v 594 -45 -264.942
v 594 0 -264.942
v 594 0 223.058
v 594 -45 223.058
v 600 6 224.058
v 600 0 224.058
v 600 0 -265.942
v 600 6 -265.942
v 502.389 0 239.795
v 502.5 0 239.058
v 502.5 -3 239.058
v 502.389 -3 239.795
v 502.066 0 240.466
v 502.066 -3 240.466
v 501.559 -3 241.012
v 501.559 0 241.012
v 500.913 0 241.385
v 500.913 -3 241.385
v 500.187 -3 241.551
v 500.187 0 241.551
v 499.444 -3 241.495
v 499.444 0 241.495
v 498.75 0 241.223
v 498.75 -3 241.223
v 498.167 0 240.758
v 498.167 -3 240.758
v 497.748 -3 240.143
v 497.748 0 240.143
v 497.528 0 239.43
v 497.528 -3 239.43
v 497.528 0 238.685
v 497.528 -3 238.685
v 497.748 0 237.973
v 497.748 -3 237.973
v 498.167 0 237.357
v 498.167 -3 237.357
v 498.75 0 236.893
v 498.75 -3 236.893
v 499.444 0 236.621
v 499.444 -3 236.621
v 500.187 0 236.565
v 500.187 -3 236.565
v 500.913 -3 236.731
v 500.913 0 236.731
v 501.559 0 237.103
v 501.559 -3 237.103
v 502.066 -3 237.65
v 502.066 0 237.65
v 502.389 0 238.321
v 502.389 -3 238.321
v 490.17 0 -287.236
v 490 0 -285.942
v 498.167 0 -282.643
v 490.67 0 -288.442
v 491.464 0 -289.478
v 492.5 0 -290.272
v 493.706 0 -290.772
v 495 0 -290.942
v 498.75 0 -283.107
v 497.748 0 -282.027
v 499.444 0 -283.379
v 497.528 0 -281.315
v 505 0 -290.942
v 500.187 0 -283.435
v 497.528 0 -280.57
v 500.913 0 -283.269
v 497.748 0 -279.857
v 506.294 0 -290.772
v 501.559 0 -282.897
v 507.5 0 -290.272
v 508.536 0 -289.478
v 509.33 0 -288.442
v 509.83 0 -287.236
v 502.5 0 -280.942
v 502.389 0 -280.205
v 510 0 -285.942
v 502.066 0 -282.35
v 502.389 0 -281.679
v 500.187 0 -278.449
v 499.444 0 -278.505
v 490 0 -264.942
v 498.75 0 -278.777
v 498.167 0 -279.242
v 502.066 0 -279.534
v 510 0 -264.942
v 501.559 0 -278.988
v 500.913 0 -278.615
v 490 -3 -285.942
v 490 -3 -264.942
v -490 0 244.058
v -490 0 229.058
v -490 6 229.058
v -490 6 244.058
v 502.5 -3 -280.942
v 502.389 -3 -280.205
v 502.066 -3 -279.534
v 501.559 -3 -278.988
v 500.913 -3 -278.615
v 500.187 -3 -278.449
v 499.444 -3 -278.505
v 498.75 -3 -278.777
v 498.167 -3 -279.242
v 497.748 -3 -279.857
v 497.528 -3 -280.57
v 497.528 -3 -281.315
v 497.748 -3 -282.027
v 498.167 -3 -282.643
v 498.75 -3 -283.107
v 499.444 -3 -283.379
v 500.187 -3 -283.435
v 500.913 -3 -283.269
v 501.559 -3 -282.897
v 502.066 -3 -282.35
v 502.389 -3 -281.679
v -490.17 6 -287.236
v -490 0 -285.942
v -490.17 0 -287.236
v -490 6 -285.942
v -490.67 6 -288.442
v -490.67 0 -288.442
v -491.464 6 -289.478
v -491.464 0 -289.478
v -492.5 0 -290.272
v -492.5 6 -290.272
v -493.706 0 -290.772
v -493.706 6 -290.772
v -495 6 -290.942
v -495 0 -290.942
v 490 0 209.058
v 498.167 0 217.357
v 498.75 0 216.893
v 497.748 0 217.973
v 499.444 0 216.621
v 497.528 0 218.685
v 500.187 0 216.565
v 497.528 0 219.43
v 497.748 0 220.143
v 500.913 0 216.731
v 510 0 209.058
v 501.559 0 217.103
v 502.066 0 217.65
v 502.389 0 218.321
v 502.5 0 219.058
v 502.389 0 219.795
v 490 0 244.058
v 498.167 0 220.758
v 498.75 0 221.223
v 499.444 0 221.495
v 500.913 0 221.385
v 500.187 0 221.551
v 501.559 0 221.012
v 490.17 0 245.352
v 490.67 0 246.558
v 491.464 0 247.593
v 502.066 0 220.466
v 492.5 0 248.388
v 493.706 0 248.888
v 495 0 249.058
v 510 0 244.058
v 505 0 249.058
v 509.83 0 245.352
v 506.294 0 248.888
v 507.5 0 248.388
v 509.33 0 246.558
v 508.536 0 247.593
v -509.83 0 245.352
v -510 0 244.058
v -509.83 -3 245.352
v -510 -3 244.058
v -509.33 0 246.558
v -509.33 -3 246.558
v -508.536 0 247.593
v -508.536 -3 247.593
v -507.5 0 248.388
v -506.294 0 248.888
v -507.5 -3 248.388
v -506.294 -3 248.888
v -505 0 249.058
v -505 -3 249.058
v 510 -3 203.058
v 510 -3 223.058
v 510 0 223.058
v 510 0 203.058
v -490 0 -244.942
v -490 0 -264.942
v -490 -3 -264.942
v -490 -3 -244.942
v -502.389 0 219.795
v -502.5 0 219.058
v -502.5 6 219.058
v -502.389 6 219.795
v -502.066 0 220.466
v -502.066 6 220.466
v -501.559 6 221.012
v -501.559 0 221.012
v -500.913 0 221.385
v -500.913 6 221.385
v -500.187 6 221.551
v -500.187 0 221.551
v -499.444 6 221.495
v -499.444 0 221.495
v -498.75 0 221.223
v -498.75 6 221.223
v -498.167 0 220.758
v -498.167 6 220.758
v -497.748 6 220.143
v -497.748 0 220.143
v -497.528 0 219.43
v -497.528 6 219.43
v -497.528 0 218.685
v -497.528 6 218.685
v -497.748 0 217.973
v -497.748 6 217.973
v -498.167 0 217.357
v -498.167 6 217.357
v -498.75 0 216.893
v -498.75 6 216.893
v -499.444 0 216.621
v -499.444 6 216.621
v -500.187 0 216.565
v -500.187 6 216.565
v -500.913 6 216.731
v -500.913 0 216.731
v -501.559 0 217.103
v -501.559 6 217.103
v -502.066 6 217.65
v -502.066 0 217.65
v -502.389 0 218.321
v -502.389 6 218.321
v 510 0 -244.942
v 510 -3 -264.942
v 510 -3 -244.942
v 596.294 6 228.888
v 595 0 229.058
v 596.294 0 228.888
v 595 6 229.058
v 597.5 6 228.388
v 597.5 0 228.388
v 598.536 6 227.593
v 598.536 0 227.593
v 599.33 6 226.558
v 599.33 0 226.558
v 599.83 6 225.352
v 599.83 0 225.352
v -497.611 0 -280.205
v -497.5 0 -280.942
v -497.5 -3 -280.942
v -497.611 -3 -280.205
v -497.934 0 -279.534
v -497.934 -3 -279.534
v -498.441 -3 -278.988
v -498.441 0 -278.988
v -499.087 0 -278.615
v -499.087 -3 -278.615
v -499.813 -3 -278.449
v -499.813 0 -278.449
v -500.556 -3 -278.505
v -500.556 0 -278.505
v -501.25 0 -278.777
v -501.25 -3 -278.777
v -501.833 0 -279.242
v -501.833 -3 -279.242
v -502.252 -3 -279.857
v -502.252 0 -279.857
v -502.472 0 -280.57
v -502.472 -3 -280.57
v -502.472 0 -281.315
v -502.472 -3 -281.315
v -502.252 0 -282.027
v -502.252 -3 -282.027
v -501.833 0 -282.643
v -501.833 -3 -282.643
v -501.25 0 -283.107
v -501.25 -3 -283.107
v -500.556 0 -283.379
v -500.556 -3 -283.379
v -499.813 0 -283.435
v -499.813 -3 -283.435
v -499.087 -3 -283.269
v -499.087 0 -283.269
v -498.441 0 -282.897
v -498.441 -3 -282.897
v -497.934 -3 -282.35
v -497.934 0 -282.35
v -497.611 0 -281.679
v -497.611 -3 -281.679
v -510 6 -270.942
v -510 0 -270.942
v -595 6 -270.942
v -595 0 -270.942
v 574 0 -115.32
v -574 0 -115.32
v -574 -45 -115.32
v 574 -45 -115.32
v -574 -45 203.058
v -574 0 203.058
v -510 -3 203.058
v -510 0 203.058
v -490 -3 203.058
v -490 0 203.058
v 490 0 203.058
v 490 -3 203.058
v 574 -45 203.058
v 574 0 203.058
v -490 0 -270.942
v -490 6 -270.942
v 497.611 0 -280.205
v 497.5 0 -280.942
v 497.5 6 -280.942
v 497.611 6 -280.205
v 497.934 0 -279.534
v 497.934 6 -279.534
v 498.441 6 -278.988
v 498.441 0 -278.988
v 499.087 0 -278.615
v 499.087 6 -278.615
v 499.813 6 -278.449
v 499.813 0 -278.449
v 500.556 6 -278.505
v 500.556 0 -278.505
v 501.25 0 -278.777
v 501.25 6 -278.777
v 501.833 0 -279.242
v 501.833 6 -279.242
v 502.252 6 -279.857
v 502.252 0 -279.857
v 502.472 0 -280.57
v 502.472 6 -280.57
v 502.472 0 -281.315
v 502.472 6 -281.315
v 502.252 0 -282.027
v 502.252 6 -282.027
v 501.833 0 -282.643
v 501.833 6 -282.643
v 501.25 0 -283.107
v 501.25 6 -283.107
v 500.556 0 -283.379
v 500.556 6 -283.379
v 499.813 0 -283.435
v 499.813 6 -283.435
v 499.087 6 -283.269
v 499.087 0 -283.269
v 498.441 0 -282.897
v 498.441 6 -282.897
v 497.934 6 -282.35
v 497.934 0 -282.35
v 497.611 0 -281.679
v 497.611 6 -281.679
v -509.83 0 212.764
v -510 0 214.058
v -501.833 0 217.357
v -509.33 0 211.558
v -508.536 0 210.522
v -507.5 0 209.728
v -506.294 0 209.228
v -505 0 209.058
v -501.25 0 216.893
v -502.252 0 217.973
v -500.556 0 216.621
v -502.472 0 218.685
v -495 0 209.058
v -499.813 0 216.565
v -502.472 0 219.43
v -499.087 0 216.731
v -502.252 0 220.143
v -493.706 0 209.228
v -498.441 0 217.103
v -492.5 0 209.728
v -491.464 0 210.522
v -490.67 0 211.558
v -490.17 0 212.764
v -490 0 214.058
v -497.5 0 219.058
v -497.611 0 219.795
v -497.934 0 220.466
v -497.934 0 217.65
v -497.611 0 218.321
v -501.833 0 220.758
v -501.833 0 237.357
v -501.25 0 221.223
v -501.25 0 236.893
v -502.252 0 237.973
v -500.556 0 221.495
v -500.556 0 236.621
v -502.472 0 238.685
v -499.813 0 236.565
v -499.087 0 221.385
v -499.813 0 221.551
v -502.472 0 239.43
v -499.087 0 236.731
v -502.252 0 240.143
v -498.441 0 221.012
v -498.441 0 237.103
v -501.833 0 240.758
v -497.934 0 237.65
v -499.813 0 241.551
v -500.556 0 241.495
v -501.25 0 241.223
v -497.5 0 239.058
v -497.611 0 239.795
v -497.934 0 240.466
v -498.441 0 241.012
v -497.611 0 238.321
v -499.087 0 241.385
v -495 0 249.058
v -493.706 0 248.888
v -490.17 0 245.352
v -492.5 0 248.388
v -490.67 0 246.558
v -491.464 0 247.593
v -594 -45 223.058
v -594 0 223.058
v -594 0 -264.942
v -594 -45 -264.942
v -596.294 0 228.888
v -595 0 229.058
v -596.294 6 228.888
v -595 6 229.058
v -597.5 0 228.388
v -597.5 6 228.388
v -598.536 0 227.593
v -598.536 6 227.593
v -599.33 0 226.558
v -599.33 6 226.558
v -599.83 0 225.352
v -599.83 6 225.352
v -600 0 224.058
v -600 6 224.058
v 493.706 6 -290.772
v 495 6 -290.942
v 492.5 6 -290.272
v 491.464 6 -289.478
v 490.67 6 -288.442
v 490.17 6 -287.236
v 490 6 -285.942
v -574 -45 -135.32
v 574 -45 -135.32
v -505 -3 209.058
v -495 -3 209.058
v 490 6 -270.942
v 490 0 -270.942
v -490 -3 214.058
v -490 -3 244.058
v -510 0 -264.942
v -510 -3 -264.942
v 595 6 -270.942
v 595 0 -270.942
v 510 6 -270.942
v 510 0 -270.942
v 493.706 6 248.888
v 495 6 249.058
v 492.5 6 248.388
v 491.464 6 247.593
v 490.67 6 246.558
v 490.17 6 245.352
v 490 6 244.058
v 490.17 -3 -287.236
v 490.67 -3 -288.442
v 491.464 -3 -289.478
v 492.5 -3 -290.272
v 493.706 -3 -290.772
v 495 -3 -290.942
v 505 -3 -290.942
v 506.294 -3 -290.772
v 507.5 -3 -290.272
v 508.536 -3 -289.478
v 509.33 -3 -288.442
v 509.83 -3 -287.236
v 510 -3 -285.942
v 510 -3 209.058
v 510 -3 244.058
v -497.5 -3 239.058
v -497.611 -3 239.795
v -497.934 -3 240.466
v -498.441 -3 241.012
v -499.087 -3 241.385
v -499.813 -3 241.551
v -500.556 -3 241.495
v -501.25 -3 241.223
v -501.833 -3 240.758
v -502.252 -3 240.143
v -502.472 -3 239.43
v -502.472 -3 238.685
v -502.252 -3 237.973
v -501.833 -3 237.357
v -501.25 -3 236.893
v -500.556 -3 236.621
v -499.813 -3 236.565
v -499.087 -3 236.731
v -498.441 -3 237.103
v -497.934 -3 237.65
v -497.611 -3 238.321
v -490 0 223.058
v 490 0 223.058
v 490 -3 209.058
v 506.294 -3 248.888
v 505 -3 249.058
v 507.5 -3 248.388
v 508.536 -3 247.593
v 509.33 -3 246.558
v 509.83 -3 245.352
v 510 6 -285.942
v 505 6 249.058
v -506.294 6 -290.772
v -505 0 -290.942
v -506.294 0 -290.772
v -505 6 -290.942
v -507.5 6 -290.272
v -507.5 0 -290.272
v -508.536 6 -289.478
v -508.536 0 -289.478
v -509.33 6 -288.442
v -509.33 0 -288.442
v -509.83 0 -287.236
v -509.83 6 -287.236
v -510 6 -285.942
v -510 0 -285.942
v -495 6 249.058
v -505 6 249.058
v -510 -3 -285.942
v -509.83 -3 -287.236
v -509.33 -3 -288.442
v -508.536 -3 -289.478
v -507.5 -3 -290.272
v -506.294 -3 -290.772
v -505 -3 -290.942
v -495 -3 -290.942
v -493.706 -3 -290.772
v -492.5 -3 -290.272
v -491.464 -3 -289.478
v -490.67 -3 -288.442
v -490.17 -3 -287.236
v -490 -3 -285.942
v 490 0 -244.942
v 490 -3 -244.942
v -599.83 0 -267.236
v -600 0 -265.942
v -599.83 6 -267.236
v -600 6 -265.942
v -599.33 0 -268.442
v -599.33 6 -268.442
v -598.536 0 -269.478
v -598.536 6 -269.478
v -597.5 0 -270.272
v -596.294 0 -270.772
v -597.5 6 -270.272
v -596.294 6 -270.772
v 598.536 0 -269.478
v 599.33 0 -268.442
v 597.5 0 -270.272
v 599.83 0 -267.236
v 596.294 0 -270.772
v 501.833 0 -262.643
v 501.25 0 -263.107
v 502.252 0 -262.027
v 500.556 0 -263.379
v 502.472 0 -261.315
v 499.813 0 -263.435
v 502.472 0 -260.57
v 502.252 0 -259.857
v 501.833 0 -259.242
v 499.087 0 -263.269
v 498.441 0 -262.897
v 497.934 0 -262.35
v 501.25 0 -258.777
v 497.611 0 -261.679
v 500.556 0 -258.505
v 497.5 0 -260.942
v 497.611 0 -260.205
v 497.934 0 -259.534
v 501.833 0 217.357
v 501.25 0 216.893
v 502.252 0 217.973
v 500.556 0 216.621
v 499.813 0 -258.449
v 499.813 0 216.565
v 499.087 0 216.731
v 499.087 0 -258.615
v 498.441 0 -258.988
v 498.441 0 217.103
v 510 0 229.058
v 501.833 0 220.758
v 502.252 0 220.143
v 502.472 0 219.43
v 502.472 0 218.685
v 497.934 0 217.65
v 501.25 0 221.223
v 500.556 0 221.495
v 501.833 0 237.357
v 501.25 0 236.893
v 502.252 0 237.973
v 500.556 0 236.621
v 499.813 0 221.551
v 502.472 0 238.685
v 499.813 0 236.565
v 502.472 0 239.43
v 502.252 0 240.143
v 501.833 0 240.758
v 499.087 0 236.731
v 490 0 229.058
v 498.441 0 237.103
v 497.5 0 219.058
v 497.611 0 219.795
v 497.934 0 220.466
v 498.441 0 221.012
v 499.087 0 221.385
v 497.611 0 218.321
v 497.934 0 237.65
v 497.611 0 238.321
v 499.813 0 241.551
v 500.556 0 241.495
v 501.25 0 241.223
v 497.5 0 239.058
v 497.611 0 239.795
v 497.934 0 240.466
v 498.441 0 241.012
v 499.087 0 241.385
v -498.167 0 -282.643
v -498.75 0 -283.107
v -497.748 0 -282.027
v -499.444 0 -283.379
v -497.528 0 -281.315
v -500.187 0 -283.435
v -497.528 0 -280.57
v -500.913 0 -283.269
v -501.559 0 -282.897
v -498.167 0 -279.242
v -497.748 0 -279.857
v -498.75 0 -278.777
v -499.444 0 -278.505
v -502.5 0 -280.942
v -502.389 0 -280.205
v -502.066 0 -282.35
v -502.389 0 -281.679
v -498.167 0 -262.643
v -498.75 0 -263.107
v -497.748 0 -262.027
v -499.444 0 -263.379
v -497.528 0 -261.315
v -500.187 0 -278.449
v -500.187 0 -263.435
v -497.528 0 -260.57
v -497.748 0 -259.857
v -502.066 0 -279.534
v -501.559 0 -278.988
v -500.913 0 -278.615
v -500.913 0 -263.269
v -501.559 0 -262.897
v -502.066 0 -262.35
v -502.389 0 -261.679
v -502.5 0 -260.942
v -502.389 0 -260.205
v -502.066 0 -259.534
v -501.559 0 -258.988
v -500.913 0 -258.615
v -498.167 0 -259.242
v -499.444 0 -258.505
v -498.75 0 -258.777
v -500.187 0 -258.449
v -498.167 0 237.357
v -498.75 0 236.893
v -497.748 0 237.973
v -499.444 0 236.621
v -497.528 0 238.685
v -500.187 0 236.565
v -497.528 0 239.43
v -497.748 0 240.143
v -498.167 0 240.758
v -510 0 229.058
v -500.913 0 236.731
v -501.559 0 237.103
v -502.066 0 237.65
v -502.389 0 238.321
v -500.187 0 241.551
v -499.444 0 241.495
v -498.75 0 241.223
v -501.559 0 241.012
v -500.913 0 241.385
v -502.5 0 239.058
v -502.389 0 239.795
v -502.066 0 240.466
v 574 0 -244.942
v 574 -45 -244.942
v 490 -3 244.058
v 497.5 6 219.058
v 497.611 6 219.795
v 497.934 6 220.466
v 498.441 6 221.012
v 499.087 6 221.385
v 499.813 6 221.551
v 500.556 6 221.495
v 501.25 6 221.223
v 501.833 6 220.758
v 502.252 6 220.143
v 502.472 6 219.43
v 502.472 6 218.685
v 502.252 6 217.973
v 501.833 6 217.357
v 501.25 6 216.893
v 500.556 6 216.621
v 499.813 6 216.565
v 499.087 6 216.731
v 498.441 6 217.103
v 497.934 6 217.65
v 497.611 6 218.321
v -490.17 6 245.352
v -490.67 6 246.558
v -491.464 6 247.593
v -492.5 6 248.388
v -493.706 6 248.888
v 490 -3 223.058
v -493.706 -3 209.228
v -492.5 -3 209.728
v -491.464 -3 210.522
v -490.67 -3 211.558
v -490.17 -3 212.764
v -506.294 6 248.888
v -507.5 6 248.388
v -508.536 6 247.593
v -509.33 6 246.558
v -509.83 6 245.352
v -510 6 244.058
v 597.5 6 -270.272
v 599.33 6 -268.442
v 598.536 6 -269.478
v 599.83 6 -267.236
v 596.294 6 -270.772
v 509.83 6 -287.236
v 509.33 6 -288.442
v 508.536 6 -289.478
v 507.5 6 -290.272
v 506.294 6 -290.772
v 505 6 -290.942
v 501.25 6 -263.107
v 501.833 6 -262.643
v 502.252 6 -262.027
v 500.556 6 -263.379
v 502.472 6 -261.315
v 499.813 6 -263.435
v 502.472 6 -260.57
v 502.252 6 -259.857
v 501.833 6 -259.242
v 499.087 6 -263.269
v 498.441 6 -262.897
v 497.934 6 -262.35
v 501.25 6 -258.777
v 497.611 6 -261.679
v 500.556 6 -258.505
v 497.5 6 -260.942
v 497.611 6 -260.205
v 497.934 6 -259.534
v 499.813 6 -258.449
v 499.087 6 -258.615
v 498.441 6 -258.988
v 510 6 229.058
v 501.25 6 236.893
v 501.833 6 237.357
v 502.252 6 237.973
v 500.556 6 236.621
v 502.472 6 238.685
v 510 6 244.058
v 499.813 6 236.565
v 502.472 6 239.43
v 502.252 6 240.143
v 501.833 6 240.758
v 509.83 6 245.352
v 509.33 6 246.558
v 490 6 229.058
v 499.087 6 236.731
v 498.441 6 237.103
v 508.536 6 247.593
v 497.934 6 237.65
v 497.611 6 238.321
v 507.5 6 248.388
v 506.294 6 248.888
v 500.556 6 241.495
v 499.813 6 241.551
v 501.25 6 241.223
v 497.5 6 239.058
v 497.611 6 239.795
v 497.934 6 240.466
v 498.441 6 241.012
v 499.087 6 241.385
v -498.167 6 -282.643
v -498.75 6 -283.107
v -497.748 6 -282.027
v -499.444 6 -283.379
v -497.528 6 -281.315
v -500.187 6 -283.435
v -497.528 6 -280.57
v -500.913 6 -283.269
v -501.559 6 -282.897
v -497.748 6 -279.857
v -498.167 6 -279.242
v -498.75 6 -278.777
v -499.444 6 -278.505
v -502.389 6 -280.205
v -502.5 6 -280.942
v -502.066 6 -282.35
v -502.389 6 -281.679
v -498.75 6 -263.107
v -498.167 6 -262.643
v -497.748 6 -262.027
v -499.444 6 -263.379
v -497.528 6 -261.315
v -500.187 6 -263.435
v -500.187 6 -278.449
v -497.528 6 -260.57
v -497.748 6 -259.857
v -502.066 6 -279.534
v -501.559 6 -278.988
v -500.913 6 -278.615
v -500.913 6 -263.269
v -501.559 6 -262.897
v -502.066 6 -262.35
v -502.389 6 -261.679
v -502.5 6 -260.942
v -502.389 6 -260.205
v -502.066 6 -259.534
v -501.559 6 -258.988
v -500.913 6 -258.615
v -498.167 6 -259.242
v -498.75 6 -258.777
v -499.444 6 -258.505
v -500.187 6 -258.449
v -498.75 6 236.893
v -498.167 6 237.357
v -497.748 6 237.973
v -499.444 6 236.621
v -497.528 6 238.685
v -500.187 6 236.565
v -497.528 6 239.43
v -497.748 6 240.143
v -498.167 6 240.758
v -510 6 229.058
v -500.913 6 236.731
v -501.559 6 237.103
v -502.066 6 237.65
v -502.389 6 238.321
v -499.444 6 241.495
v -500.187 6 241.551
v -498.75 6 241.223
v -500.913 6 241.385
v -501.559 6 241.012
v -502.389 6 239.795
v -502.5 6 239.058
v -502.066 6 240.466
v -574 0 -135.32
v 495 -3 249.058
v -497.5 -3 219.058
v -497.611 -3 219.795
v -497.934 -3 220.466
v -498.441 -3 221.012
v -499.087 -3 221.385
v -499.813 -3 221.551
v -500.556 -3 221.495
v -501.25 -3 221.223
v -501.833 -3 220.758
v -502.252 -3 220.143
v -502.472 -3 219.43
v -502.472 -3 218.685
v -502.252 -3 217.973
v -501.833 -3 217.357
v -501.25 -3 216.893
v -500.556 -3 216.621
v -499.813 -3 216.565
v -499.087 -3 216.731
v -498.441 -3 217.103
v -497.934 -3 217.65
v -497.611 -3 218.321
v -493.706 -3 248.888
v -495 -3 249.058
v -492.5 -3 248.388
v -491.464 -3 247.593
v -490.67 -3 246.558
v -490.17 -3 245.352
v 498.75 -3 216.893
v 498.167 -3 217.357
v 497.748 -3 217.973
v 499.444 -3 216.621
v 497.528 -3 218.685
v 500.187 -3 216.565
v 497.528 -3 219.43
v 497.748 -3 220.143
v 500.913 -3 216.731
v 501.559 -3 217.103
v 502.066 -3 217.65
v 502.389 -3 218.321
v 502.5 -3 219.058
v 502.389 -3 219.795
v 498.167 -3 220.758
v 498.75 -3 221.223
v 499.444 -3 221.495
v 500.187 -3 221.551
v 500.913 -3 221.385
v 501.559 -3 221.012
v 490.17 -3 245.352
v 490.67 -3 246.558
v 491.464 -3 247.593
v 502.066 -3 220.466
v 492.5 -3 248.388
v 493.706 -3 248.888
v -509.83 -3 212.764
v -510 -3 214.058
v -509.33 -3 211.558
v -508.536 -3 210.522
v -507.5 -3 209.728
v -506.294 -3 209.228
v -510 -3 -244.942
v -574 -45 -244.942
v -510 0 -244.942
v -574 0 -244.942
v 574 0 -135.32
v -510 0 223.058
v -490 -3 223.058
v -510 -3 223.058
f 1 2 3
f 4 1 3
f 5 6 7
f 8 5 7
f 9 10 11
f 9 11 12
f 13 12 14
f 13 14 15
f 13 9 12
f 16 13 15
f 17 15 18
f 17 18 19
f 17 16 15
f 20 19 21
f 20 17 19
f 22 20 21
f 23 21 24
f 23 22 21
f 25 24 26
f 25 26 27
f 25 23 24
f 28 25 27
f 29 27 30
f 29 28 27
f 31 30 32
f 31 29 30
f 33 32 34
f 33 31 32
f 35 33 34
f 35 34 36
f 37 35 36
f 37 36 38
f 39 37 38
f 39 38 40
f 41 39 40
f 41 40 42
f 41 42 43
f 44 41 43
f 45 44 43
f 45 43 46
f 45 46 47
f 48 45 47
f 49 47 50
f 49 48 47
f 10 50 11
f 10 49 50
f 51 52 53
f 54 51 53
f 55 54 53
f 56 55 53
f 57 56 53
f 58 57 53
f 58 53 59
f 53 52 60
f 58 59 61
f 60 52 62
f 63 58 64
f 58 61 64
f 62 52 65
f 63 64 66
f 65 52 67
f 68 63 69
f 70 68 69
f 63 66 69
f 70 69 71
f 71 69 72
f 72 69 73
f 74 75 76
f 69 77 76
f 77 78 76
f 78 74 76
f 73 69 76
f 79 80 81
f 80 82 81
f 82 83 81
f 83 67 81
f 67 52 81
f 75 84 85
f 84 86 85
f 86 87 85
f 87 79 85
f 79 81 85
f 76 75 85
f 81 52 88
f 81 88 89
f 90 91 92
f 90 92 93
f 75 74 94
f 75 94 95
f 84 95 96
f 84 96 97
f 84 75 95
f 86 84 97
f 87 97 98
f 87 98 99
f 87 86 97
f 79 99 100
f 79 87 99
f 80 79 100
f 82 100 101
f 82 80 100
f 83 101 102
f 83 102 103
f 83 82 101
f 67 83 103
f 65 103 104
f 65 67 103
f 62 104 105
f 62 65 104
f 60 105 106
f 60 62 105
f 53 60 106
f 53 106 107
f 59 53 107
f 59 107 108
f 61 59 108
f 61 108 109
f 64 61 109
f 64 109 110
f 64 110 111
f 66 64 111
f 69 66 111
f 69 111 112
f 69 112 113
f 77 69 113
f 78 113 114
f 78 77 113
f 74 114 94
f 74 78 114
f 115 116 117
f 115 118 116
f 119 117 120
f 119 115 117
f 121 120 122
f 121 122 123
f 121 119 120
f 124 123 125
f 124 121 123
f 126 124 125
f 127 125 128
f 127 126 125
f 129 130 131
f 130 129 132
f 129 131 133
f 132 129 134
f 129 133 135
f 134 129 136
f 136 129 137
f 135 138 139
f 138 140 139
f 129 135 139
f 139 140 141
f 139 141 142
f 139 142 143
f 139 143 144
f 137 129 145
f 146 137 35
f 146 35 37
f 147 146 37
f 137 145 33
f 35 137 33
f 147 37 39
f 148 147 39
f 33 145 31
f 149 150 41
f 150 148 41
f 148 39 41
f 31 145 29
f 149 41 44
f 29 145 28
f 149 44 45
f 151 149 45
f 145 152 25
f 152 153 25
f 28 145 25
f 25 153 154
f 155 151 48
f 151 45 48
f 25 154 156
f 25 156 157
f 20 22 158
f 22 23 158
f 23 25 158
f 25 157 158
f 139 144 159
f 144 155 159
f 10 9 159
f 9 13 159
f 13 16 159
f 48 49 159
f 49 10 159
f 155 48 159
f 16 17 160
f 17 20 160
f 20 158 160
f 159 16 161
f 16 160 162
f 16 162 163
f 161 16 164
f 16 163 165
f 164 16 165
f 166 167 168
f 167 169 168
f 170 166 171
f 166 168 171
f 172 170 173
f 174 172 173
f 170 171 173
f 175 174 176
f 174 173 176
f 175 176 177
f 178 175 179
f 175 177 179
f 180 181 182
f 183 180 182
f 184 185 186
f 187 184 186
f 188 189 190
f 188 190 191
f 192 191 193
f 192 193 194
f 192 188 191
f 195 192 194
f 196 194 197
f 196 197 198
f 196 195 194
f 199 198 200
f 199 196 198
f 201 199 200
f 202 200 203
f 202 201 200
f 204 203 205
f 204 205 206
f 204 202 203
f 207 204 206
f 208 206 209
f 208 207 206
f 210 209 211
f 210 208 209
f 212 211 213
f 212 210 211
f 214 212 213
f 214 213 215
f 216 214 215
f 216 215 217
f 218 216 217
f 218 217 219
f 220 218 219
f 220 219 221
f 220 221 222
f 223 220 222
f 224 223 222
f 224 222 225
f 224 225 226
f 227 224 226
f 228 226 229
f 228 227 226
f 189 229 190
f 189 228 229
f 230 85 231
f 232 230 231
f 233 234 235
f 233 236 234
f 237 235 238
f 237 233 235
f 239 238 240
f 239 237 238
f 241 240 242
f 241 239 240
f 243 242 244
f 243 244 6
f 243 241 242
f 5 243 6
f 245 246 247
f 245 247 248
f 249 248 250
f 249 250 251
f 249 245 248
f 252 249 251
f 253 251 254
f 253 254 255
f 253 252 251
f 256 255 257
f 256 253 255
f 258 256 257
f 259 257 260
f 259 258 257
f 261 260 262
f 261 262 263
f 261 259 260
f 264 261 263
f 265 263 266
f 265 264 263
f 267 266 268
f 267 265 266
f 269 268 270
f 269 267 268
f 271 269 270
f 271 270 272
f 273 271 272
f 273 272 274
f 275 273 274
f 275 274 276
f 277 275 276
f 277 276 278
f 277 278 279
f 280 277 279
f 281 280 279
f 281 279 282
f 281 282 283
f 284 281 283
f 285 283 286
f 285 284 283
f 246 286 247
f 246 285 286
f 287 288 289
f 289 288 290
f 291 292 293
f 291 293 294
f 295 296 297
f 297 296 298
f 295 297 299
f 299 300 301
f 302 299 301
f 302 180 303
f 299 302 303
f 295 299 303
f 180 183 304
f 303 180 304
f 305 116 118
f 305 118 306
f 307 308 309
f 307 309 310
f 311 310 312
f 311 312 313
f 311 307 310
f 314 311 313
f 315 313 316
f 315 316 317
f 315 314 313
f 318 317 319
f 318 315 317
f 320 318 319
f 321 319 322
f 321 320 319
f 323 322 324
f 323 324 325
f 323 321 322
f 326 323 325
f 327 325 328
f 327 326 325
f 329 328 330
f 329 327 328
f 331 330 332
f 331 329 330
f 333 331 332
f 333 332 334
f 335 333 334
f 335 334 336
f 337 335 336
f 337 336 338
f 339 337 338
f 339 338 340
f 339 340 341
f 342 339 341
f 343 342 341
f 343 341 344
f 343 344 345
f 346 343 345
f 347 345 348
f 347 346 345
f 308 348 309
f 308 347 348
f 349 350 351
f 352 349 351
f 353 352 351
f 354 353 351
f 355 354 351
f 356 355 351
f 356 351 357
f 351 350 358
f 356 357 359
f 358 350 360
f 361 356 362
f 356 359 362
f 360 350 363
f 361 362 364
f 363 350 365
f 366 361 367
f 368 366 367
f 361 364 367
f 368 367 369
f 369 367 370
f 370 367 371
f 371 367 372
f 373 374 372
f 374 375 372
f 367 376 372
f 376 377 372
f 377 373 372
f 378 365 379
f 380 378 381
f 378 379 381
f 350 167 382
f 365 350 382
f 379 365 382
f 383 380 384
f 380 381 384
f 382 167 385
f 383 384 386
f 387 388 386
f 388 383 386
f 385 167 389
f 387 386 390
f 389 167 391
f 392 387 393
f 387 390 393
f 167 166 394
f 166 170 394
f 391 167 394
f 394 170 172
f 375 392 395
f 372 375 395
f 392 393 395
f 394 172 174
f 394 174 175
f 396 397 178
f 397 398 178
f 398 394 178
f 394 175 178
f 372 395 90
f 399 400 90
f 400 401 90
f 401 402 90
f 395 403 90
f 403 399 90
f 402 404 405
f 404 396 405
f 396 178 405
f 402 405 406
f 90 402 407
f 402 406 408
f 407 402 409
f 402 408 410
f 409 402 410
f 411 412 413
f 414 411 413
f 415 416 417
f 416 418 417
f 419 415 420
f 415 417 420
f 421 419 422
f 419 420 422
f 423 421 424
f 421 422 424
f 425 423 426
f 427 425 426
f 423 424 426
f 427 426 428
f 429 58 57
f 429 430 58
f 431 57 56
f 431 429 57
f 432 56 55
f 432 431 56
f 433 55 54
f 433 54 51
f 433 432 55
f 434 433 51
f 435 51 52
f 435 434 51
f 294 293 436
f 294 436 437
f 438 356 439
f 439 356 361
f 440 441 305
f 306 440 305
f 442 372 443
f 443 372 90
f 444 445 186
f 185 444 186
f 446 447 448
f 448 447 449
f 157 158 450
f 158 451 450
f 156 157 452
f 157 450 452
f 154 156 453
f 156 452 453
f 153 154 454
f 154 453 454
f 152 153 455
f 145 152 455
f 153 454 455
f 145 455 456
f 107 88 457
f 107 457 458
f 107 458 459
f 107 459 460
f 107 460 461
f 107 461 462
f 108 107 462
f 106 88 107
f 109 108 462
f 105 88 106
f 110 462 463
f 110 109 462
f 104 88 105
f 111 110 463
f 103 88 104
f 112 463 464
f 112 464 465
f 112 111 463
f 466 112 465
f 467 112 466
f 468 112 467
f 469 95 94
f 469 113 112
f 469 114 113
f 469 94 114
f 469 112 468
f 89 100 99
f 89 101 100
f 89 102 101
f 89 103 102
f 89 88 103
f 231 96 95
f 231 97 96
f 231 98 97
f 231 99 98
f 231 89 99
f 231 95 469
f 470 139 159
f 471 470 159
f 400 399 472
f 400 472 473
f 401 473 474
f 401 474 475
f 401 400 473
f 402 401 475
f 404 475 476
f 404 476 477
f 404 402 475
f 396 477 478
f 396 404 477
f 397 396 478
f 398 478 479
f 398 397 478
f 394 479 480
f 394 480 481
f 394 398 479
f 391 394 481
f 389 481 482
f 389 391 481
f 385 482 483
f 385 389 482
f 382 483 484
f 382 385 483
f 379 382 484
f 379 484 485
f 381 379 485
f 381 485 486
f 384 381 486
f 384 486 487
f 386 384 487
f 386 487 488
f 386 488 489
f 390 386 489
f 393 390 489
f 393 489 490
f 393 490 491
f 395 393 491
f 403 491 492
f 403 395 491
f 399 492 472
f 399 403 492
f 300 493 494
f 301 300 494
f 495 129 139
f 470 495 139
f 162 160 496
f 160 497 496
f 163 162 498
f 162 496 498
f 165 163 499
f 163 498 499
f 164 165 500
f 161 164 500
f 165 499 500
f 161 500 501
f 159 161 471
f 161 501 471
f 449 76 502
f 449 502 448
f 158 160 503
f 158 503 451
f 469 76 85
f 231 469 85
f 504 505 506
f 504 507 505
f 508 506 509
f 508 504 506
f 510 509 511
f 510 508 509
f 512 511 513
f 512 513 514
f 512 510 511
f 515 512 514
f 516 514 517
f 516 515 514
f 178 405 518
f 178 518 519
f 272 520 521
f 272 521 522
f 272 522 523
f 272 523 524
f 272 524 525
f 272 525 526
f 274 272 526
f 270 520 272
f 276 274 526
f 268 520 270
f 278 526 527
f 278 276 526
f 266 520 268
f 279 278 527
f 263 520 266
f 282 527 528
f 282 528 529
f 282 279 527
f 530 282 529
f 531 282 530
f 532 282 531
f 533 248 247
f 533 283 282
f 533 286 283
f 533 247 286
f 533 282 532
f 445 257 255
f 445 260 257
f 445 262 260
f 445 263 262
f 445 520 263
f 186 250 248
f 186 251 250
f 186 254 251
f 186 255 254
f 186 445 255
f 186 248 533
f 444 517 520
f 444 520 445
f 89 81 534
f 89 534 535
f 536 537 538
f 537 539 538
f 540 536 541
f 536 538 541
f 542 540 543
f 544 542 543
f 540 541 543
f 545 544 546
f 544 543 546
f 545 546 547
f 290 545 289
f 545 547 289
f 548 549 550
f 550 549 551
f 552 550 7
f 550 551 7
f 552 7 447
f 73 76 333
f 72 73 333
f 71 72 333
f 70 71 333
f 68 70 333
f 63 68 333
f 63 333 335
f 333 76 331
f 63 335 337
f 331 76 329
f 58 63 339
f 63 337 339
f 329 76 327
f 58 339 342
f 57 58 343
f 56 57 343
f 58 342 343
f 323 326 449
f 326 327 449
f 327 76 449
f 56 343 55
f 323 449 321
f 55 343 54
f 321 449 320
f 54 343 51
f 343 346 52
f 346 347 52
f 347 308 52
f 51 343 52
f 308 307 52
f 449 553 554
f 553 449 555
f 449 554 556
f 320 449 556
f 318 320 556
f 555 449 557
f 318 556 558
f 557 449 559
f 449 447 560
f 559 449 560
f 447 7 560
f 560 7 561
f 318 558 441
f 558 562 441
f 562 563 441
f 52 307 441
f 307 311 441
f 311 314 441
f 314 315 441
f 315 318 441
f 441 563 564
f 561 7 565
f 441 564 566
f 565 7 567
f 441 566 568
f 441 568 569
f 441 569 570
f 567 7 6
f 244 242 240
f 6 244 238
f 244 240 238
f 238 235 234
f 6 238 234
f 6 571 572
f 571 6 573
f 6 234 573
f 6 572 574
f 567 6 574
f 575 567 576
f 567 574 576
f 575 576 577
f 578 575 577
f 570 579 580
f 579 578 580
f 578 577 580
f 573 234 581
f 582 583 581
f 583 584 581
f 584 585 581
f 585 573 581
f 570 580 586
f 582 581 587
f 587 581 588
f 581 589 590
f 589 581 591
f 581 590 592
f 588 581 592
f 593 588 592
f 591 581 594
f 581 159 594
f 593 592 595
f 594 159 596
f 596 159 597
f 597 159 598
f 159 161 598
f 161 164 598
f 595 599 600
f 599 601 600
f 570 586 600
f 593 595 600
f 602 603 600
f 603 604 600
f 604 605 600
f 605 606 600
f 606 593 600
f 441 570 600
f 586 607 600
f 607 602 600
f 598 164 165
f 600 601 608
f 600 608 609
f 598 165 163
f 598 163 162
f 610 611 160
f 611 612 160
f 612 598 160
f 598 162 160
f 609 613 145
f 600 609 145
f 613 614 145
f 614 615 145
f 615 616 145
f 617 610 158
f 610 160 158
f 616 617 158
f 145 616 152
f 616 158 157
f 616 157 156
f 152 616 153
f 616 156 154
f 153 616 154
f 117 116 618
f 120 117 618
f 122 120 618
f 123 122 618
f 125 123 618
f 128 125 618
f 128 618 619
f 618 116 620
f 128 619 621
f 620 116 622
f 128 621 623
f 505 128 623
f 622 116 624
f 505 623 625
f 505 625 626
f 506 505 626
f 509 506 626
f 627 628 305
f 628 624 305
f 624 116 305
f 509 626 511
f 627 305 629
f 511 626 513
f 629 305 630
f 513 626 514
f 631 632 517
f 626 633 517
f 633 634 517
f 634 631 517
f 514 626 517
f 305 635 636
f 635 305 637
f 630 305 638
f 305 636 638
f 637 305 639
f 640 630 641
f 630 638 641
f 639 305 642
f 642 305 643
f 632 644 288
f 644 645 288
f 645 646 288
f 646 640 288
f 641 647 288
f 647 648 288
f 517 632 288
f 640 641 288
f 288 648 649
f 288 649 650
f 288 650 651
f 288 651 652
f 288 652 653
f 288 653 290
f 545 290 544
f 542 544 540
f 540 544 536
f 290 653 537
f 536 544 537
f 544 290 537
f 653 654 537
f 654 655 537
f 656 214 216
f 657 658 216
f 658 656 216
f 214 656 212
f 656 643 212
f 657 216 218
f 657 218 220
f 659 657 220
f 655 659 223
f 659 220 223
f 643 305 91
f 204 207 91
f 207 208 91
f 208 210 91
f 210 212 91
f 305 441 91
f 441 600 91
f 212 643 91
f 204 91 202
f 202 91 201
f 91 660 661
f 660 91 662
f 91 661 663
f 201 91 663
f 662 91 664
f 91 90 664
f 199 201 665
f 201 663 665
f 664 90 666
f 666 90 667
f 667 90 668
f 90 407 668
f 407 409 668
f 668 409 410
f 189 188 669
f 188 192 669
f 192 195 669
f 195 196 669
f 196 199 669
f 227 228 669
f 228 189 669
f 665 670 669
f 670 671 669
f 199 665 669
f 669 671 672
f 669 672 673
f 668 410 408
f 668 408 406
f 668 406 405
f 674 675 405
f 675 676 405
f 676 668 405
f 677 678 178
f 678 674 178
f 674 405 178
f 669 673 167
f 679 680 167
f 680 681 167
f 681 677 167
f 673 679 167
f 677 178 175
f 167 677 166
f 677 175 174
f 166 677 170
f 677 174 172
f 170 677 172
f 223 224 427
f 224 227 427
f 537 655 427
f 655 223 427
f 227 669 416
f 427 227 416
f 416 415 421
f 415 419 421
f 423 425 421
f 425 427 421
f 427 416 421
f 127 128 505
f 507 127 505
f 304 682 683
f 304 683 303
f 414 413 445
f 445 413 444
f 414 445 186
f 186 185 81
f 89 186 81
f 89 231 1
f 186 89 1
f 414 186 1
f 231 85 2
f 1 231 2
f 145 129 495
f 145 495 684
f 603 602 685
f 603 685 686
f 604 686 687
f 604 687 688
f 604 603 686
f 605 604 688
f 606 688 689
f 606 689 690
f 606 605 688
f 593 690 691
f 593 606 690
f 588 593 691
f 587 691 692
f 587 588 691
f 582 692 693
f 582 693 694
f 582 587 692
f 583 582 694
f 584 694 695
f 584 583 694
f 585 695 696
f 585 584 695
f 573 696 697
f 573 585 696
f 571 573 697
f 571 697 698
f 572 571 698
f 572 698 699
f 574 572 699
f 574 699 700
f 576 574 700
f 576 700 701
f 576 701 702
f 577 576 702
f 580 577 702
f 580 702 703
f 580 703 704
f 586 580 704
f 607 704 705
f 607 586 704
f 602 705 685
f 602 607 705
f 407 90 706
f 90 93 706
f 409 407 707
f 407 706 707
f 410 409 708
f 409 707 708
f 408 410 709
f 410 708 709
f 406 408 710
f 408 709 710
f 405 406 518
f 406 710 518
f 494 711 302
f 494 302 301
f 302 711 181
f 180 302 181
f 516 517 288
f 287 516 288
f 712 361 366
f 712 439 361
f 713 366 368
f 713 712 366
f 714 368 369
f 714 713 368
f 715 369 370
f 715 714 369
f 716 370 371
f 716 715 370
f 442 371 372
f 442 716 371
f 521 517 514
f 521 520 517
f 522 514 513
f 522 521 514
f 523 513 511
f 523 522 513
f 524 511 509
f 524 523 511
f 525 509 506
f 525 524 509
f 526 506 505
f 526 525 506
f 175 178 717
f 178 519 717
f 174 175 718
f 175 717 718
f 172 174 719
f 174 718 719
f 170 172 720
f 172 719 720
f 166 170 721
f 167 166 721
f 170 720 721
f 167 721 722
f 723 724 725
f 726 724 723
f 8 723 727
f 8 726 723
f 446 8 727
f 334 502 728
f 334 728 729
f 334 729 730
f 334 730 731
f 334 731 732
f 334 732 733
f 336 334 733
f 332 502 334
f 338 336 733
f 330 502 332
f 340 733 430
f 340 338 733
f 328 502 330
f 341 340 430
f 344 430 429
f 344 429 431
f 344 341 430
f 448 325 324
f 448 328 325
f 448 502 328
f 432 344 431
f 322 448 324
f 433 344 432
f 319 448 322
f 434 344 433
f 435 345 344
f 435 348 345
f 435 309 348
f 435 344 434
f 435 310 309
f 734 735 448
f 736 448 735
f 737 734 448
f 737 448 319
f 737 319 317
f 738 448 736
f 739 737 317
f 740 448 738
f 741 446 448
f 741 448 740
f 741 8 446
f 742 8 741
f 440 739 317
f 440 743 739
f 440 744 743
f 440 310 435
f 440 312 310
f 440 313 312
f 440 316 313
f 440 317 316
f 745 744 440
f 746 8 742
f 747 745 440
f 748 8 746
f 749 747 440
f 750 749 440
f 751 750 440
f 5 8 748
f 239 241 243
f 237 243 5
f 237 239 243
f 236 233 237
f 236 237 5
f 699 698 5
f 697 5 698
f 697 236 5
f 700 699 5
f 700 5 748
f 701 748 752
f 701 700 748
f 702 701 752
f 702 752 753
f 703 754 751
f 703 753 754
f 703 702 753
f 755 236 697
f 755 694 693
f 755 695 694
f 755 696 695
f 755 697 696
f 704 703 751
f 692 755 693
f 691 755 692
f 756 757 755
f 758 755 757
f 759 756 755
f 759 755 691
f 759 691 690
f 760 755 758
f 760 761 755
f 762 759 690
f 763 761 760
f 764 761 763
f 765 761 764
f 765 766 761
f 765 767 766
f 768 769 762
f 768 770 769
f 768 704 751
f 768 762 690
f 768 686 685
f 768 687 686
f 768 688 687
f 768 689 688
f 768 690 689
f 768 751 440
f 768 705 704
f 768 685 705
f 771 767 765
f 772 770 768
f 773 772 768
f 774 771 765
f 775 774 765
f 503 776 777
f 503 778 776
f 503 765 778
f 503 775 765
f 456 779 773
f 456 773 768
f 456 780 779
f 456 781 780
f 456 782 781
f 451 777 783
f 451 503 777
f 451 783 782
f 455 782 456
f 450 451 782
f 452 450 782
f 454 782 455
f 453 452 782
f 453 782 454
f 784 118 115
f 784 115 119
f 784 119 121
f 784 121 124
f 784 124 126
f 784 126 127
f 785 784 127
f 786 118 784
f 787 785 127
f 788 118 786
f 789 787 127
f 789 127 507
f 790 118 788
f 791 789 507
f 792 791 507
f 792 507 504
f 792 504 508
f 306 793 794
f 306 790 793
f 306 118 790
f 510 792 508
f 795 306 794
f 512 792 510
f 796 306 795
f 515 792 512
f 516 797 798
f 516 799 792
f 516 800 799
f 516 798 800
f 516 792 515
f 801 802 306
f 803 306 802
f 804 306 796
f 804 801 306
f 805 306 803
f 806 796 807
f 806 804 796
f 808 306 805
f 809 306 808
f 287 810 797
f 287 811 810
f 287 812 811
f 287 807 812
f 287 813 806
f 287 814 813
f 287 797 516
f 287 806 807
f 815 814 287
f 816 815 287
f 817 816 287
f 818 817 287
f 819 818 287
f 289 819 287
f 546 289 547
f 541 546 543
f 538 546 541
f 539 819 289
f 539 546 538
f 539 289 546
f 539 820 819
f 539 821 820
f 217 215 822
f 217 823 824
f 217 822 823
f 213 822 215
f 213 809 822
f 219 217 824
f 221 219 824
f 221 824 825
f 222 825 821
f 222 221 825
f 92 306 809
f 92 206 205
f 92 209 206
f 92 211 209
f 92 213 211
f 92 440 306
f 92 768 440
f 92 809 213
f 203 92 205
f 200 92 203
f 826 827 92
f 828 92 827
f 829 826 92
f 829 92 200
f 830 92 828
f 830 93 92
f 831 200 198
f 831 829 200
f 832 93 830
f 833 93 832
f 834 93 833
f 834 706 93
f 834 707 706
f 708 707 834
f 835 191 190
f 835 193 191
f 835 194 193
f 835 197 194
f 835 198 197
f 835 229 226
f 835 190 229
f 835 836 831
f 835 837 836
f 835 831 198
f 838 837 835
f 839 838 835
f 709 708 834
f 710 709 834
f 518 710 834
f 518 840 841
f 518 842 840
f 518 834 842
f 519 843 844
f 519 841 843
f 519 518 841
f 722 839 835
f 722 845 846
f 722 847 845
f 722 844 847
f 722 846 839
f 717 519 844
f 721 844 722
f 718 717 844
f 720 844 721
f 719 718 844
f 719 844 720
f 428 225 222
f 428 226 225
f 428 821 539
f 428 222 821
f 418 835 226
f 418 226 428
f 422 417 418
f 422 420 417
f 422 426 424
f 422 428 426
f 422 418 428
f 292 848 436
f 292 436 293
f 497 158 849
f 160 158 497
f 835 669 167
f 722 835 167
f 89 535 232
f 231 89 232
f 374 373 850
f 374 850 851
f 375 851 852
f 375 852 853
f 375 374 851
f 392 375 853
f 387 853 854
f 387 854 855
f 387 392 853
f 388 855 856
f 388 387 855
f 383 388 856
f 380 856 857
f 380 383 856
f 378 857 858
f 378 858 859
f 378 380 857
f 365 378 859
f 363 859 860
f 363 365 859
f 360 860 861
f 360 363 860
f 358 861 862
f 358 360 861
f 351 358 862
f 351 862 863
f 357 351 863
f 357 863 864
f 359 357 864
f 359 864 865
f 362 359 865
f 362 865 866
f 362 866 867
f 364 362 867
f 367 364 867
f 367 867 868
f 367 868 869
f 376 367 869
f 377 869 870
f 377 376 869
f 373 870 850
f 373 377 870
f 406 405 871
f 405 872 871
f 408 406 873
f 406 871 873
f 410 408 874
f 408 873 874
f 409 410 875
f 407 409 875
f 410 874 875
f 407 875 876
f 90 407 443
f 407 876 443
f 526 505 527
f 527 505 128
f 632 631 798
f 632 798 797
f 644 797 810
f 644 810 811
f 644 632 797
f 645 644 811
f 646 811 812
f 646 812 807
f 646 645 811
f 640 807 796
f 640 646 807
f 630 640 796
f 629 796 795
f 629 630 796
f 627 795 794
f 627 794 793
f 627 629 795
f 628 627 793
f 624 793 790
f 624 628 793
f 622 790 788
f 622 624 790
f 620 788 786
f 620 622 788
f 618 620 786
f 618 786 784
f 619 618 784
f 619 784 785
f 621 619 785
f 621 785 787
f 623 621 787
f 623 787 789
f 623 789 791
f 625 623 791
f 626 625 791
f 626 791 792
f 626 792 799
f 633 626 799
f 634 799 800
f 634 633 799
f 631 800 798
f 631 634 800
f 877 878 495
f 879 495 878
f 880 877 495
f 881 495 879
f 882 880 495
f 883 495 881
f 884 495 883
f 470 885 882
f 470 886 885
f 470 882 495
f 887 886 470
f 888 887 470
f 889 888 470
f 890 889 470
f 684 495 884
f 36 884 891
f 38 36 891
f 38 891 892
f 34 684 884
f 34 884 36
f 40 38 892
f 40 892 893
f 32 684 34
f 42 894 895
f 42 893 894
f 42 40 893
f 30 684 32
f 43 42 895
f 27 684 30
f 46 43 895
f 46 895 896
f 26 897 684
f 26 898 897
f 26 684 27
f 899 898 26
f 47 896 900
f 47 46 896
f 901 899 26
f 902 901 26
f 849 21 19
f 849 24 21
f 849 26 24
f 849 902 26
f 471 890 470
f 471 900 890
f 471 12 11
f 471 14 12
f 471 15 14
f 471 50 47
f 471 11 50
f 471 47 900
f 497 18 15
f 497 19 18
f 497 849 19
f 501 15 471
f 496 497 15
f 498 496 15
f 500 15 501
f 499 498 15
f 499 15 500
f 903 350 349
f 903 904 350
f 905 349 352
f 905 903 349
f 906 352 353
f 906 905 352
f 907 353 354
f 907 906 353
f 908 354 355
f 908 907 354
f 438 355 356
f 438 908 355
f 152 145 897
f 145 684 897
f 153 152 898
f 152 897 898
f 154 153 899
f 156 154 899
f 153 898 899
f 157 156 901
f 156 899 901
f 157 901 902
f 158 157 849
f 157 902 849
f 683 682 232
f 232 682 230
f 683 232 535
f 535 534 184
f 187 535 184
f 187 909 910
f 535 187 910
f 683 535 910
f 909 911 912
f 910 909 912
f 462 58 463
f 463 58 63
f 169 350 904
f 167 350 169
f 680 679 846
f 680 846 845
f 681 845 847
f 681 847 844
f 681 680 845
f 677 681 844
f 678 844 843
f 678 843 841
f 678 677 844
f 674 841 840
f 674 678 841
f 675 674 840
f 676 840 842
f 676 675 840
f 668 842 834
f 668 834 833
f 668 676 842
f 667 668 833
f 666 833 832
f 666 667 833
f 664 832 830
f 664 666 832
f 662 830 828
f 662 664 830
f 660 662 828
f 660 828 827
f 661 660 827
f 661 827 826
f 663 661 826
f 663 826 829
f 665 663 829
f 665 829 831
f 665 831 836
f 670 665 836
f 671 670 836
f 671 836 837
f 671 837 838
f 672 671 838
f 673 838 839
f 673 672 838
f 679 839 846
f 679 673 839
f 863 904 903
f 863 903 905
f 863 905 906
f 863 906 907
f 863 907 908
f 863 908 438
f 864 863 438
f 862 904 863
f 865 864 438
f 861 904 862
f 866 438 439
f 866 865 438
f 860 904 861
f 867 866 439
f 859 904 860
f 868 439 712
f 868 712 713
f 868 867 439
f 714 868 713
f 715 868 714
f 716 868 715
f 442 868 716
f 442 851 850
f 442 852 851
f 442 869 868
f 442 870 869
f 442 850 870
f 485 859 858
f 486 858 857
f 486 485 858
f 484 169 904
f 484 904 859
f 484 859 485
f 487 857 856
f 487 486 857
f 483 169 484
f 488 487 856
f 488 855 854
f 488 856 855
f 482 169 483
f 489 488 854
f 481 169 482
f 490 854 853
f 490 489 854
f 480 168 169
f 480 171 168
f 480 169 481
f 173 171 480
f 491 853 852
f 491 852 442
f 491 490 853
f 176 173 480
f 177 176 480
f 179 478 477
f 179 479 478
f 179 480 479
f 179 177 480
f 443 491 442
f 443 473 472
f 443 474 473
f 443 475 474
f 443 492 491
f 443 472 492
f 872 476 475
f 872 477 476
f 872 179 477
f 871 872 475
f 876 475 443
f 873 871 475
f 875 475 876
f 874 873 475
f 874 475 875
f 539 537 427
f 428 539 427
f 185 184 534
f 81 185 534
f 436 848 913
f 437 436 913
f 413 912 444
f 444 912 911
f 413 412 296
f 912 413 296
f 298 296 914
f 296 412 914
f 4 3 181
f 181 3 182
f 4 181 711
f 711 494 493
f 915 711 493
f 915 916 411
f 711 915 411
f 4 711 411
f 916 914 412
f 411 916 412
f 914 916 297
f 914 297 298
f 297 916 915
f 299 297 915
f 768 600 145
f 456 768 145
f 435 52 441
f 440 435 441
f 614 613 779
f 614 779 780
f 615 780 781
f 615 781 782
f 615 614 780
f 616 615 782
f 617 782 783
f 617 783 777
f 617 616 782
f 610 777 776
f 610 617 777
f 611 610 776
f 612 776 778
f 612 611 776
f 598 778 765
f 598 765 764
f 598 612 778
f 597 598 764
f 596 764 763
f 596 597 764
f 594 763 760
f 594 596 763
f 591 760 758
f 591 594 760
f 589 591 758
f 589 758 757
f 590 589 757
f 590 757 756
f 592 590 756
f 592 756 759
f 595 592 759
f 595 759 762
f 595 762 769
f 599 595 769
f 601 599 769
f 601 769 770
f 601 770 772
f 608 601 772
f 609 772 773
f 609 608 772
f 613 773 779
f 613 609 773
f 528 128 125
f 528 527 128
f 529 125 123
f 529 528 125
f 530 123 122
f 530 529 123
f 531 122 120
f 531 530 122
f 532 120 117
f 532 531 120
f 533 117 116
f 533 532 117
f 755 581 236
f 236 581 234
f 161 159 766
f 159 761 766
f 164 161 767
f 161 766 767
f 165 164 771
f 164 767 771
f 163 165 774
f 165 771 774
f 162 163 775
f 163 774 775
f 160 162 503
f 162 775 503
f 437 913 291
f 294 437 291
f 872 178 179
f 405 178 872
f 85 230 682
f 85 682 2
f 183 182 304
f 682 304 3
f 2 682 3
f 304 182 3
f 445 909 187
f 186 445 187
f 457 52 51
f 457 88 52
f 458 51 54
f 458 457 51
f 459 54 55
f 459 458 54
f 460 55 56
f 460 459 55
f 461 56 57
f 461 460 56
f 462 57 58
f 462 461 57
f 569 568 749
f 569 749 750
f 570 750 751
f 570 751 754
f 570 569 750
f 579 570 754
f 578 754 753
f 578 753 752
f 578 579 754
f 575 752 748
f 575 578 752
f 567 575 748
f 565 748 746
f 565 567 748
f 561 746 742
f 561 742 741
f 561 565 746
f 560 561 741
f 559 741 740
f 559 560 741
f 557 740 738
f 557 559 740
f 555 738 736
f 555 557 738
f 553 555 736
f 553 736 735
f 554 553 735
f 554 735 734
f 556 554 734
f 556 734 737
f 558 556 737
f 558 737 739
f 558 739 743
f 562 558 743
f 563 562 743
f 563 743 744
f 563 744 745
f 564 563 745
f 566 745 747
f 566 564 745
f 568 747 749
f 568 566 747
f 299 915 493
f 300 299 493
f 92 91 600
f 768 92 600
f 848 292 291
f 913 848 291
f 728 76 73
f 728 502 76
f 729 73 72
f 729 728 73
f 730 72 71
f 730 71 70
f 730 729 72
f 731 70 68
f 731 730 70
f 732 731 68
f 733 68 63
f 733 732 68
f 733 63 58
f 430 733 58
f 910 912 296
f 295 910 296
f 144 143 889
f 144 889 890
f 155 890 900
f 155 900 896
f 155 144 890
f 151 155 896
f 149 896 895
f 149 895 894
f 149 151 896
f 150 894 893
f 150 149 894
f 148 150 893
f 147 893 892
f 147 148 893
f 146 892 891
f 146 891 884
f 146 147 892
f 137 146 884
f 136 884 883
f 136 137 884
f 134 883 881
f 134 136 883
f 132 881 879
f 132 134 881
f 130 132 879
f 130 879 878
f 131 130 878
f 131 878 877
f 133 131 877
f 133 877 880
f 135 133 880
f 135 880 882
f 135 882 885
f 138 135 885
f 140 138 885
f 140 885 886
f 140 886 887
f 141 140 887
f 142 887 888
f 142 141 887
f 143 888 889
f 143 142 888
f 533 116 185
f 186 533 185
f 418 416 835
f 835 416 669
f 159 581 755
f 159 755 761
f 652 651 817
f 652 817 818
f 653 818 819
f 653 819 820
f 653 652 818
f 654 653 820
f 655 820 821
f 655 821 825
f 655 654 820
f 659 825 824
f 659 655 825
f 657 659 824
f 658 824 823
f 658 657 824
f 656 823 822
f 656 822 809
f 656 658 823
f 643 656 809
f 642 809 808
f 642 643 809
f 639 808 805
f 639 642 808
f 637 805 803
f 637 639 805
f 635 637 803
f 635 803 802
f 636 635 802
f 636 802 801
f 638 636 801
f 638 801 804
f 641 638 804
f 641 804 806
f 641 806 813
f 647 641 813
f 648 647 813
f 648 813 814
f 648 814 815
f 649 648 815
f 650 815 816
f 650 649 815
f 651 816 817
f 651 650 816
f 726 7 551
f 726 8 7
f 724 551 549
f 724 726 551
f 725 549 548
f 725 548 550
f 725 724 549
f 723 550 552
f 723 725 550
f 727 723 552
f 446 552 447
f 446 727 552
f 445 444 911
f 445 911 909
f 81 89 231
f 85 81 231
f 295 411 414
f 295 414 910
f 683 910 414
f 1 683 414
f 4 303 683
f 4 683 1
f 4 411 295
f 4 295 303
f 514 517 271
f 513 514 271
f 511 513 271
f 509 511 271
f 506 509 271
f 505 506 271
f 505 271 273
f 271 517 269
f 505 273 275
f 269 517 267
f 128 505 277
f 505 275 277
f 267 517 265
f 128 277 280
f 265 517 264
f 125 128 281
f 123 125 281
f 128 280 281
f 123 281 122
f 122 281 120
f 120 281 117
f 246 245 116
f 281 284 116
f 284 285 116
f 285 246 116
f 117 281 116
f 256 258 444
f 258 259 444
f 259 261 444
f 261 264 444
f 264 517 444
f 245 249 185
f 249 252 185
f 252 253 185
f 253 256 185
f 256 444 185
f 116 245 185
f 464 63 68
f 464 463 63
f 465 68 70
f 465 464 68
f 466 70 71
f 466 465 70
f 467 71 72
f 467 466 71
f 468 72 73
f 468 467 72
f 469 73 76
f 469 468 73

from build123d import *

# Parameters (mm, degrees)
F0_W      = 20
F0_H      = 448
F1_DEPTH  = 45
F2_W      = 20
F2_H      = 20
F2_R      = 2.5
F3_DEPTH  = 6
F4_W      = 1148
F4_H      = 20
F5_DEPTH  = 45
F6_R      = 5
F7_R      = 5
F8_W      = 20
F8_H      = 3
F9_DEPTH  = 25
F10_W     = 20
F10_H     = 40
F10_R     = 2.5
F11_DEPTH = 3
F12_R     = 5
F13_W     = 20
F13_H     = 3
F14_DEPTH = 25
F15_R     = 5
F15_2_R   = 5
F16_R     = 5


with BuildPart() as f1:
    # F0 (on Front) → F1 (new body)
    with BuildSketch(Plane.XZ):
        Polygon((-594, 223.0578817198), (-594, 203.0578817198), (-574, 203.0578817198), (574, 203.0578817198), (594, 203.0578817198), (594, 223.0578817198), align=None)
        with Locations((-584, -20.9421182802)):
            Rectangle(F0_W, F0_H)
        Polygon((-574, -244.9421182802), (-594, -244.9421182802), (-594, -264.9421182802), (594, -264.9421182802), (594, -244.9421182802), (574, -244.9421182802), align=None)
        with Locations((584, -20.9421182802)):
            Rectangle(F0_W, F0_H)
    extrude(amount=F1_DEPTH)

    # F8 (on face) → F9 (cut)
    with BuildSketch(Plane.XY.offset(223.0578817198)):
        with Locations((-500.0000202656, -1.5)):
            Rectangle(F8_W, F8_H)
        with Locations((500.0000202656, -1.5)):
            Rectangle(F8_W, F8_H)
    extrude(amount=-F9_DEPTH, mode=Mode.SUBTRACT)


with BuildPart() as f3:
    # F2 (on face) → F3 (new body)
    with BuildSketch(Plane(origin=(0, 0, 0), x_dir=(-1, 0, 0), z_dir=(0, 1, 0))):
        Polygon((-510, 229.0578817198), (-600, 229.0578817198), (-600, -270.9421182802), (-510, -270.9421182802), (-510, -250.9421182802), (-490, -250.9421182802), (-490, -270.9421182802), (490, -270.9421182802), (490, -250.9421182802), (510, -250.9421182802), (510, -270.9421182802), (600, -270.9421182802), (600, 229.0578817198), (510, 229.0578817198), (510, 209.0578817198), (490, 209.0578817198), (490, 229.0578817198), (-490, 229.0578817198), (-490, 209.0578817198), (-510, 209.0578817198), align=None)
        with Locations((-500, 239.0578817198)):
            Rectangle(F2_W, F2_H)
        with Locations((-500, 239.0578817198)):
            Circle(F2_R, mode=Mode.SUBTRACT)
        with Locations((-500, 219.0578817198)):
            Rectangle(F2_W, F2_H)
        with Locations((-500, 219.0578817198)):
            Circle(F2_R, mode=Mode.SUBTRACT)
        with Locations((-500, -260.9421182802)):
            Rectangle(F2_W, F2_H)
        with Locations((-500, -260.9421182802)):
            Circle(F2_R, mode=Mode.SUBTRACT)
        with Locations((-500, -280.9421182802)):
            Rectangle(F2_W, F2_H)
        with Locations((-500, -280.9421182802)):
            Circle(F2_R, mode=Mode.SUBTRACT)
        with Locations((500, 239.0578817198)):
            Rectangle(F2_W, F2_H)
        with Locations((500, 239.0578817198)):
            Circle(F2_R, mode=Mode.SUBTRACT)
        with Locations((500, 219.0578817198)):
            Rectangle(F2_W, F2_H)
        with Locations((500, 219.0578817198)):
            Circle(F2_R, mode=Mode.SUBTRACT)
        with Locations((500, -260.9421182802)):
            Rectangle(F2_W, F2_H)
        with Locations((500, -260.9421182802)):
            Circle(F2_R, mode=Mode.SUBTRACT)
        with Locations((500, -280.9421182802)):
            Rectangle(F2_W, F2_H)
        with Locations((500, -280.9421182802)):
            Circle(F2_R, mode=Mode.SUBTRACT)
    extrude(amount=F3_DEPTH)

    # F6
    f6_edges = [f3.edges().sort_by_distance(p)[0] for p in [
        (510, 3, 249.057882),
        (490, 3, 249.057882),
    ]]
    fillet(f6_edges, radius=F6_R)

    # F7
    f7_edges = [f3.edges().sort_by_distance(p)[0] for p in [
        (510, 3, -290.942118),
        (490, 3, -290.942118),
        (-510, 3, 249.057882),
        (-490, 3, 249.057882),
        (-510, 3, -290.942118),
        (-490, 3, -290.942118),
        (600, 3, 229.057882),
        (-600, 3, 229.057882),
        (600, 3, -270.942118),
        (-600, 3, -270.942118),
    ]]
    fillet(f7_edges, radius=F7_R)


with BuildPart() as f5:
    # F4 (on face) → F5 (new body)
    with BuildSketch(Plane.XZ):
        with Locations((0, -125.320276022)):
            Rectangle(F4_W, F4_H)
    extrude(amount=F5_DEPTH)


with BuildPart() as f11:
    # F10 (on face) → F11 (new body)
    with BuildSketch(Plane.XZ):
        with Locations((-500, 229.0578817198)):
            Rectangle(F10_W, F10_H)
        with Locations((-500, 219.0578817198)):
            Circle(F10_R, mode=Mode.SUBTRACT)
        with Locations((-500, 239.0578817198)):
            Circle(F10_R, mode=Mode.SUBTRACT)
    extrude(amount=F11_DEPTH)

    # F12
    f12_edges = [f11.edges().sort_by_distance(p)[0] for p in [
        (-510, -1.5, 249.057882),
        (-490, -1.5, 249.057882),
        (-490, -1.5, 209.057882),
        (-510, -1.5, 209.057882),
    ]]
    fillet(f12_edges, radius=F12_R)


with BuildPart() as f11b:
    # F10 (on face) → F11, piece 2 (new body)
    with BuildSketch(Plane.XZ):
        with Locations((500, 229.0578817198)):
            Rectangle(F10_W, F10_H)
        with Locations((500, 219.0578817198)):
            Circle(F10_R, mode=Mode.SUBTRACT)
        with Locations((500, 239.0578817198)):
            Circle(F10_R, mode=Mode.SUBTRACT)
    extrude(amount=F11_DEPTH)

    # F15
    f15_edges = [f11b.edges().sort_by_distance(p)[0] for p in [
        (510, -1.5, 249.057882),
        (490, -1.5, 249.057882),
    ]]
    fillet(f15_edges, radius=F15_R)


with BuildPart() as f11c:
    # F10 (on face) → F11, piece 3 (new body)
    with BuildSketch(Plane.XZ):
        with Locations((-500, -270.9421182802)):
            Rectangle(F10_W, F10_H)
        with Locations((-500, -280.9421182802)):
            Circle(F10_R, mode=Mode.SUBTRACT)
        with Locations((-500, -260.9421182802)):
            Circle(F10_R, mode=Mode.SUBTRACT)
    extrude(amount=F11_DEPTH)


with BuildPart() as f11d:
    # F10 (on face) → F11, piece 4 (new body)
    with BuildSketch(Plane.XZ):
        with Locations((500, -270.9421182802)):
            Rectangle(F10_W, F10_H)
        with Locations((500, -280.9421182802)):
            Circle(F10_R, mode=Mode.SUBTRACT)
        with Locations((500, -260.9421182802)):
            Circle(F10_R, mode=Mode.SUBTRACT)
    extrude(amount=F11_DEPTH)


with BuildPart() as f14_tool:
    # F13 (on face) → F14 (new body)
    with BuildSketch(Plane(origin=(0, 0, -264.9421182802), x_dir=(1, 0, 0), z_dir=(0, 0, -1))):
        with Locations((500, 1.5)):
            Rectangle(F13_W, F13_H)
        with Locations((-500, 1.5)):
            Rectangle(F13_W, F13_H)
    extrude(amount=-F14_DEPTH)


with BuildPart() as f1_1:
    add(f1.part)

    # F14: cut by f14_tool
    add(f14_tool.part, mode=Mode.SUBTRACT)


with BuildPart() as f11c_1:
    add(f11c.part)

    # F14: cut by f14_tool
    add(f14_tool.part, mode=Mode.SUBTRACT)

    # F15#2
    f15_2_edges = [f11c_1.edges().sort_by_distance(p)[0] for p in [
        (-510, -1.5, -290.942118),
        (-490, -1.5, -290.942118),
    ]]
    fillet(f15_2_edges, radius=F15_2_R)


with BuildPart() as f11d_1:
    add(f11d.part)

    # F14: cut by f14_tool
    add(f14_tool.part, mode=Mode.SUBTRACT)

    # F16
    f16_edges = [f11d_1.edges().sort_by_distance(p)[0] for p in [
        (510, -1.5, -290.942118),
        (490, -1.5, -290.942118),
    ]]
    fillet(f16_edges, radius=F16_R)


solid = Compound([f3.part, f5.part, f11.part, f11b.part, f1_1.part, f11c_1.part, f11d_1.part])
